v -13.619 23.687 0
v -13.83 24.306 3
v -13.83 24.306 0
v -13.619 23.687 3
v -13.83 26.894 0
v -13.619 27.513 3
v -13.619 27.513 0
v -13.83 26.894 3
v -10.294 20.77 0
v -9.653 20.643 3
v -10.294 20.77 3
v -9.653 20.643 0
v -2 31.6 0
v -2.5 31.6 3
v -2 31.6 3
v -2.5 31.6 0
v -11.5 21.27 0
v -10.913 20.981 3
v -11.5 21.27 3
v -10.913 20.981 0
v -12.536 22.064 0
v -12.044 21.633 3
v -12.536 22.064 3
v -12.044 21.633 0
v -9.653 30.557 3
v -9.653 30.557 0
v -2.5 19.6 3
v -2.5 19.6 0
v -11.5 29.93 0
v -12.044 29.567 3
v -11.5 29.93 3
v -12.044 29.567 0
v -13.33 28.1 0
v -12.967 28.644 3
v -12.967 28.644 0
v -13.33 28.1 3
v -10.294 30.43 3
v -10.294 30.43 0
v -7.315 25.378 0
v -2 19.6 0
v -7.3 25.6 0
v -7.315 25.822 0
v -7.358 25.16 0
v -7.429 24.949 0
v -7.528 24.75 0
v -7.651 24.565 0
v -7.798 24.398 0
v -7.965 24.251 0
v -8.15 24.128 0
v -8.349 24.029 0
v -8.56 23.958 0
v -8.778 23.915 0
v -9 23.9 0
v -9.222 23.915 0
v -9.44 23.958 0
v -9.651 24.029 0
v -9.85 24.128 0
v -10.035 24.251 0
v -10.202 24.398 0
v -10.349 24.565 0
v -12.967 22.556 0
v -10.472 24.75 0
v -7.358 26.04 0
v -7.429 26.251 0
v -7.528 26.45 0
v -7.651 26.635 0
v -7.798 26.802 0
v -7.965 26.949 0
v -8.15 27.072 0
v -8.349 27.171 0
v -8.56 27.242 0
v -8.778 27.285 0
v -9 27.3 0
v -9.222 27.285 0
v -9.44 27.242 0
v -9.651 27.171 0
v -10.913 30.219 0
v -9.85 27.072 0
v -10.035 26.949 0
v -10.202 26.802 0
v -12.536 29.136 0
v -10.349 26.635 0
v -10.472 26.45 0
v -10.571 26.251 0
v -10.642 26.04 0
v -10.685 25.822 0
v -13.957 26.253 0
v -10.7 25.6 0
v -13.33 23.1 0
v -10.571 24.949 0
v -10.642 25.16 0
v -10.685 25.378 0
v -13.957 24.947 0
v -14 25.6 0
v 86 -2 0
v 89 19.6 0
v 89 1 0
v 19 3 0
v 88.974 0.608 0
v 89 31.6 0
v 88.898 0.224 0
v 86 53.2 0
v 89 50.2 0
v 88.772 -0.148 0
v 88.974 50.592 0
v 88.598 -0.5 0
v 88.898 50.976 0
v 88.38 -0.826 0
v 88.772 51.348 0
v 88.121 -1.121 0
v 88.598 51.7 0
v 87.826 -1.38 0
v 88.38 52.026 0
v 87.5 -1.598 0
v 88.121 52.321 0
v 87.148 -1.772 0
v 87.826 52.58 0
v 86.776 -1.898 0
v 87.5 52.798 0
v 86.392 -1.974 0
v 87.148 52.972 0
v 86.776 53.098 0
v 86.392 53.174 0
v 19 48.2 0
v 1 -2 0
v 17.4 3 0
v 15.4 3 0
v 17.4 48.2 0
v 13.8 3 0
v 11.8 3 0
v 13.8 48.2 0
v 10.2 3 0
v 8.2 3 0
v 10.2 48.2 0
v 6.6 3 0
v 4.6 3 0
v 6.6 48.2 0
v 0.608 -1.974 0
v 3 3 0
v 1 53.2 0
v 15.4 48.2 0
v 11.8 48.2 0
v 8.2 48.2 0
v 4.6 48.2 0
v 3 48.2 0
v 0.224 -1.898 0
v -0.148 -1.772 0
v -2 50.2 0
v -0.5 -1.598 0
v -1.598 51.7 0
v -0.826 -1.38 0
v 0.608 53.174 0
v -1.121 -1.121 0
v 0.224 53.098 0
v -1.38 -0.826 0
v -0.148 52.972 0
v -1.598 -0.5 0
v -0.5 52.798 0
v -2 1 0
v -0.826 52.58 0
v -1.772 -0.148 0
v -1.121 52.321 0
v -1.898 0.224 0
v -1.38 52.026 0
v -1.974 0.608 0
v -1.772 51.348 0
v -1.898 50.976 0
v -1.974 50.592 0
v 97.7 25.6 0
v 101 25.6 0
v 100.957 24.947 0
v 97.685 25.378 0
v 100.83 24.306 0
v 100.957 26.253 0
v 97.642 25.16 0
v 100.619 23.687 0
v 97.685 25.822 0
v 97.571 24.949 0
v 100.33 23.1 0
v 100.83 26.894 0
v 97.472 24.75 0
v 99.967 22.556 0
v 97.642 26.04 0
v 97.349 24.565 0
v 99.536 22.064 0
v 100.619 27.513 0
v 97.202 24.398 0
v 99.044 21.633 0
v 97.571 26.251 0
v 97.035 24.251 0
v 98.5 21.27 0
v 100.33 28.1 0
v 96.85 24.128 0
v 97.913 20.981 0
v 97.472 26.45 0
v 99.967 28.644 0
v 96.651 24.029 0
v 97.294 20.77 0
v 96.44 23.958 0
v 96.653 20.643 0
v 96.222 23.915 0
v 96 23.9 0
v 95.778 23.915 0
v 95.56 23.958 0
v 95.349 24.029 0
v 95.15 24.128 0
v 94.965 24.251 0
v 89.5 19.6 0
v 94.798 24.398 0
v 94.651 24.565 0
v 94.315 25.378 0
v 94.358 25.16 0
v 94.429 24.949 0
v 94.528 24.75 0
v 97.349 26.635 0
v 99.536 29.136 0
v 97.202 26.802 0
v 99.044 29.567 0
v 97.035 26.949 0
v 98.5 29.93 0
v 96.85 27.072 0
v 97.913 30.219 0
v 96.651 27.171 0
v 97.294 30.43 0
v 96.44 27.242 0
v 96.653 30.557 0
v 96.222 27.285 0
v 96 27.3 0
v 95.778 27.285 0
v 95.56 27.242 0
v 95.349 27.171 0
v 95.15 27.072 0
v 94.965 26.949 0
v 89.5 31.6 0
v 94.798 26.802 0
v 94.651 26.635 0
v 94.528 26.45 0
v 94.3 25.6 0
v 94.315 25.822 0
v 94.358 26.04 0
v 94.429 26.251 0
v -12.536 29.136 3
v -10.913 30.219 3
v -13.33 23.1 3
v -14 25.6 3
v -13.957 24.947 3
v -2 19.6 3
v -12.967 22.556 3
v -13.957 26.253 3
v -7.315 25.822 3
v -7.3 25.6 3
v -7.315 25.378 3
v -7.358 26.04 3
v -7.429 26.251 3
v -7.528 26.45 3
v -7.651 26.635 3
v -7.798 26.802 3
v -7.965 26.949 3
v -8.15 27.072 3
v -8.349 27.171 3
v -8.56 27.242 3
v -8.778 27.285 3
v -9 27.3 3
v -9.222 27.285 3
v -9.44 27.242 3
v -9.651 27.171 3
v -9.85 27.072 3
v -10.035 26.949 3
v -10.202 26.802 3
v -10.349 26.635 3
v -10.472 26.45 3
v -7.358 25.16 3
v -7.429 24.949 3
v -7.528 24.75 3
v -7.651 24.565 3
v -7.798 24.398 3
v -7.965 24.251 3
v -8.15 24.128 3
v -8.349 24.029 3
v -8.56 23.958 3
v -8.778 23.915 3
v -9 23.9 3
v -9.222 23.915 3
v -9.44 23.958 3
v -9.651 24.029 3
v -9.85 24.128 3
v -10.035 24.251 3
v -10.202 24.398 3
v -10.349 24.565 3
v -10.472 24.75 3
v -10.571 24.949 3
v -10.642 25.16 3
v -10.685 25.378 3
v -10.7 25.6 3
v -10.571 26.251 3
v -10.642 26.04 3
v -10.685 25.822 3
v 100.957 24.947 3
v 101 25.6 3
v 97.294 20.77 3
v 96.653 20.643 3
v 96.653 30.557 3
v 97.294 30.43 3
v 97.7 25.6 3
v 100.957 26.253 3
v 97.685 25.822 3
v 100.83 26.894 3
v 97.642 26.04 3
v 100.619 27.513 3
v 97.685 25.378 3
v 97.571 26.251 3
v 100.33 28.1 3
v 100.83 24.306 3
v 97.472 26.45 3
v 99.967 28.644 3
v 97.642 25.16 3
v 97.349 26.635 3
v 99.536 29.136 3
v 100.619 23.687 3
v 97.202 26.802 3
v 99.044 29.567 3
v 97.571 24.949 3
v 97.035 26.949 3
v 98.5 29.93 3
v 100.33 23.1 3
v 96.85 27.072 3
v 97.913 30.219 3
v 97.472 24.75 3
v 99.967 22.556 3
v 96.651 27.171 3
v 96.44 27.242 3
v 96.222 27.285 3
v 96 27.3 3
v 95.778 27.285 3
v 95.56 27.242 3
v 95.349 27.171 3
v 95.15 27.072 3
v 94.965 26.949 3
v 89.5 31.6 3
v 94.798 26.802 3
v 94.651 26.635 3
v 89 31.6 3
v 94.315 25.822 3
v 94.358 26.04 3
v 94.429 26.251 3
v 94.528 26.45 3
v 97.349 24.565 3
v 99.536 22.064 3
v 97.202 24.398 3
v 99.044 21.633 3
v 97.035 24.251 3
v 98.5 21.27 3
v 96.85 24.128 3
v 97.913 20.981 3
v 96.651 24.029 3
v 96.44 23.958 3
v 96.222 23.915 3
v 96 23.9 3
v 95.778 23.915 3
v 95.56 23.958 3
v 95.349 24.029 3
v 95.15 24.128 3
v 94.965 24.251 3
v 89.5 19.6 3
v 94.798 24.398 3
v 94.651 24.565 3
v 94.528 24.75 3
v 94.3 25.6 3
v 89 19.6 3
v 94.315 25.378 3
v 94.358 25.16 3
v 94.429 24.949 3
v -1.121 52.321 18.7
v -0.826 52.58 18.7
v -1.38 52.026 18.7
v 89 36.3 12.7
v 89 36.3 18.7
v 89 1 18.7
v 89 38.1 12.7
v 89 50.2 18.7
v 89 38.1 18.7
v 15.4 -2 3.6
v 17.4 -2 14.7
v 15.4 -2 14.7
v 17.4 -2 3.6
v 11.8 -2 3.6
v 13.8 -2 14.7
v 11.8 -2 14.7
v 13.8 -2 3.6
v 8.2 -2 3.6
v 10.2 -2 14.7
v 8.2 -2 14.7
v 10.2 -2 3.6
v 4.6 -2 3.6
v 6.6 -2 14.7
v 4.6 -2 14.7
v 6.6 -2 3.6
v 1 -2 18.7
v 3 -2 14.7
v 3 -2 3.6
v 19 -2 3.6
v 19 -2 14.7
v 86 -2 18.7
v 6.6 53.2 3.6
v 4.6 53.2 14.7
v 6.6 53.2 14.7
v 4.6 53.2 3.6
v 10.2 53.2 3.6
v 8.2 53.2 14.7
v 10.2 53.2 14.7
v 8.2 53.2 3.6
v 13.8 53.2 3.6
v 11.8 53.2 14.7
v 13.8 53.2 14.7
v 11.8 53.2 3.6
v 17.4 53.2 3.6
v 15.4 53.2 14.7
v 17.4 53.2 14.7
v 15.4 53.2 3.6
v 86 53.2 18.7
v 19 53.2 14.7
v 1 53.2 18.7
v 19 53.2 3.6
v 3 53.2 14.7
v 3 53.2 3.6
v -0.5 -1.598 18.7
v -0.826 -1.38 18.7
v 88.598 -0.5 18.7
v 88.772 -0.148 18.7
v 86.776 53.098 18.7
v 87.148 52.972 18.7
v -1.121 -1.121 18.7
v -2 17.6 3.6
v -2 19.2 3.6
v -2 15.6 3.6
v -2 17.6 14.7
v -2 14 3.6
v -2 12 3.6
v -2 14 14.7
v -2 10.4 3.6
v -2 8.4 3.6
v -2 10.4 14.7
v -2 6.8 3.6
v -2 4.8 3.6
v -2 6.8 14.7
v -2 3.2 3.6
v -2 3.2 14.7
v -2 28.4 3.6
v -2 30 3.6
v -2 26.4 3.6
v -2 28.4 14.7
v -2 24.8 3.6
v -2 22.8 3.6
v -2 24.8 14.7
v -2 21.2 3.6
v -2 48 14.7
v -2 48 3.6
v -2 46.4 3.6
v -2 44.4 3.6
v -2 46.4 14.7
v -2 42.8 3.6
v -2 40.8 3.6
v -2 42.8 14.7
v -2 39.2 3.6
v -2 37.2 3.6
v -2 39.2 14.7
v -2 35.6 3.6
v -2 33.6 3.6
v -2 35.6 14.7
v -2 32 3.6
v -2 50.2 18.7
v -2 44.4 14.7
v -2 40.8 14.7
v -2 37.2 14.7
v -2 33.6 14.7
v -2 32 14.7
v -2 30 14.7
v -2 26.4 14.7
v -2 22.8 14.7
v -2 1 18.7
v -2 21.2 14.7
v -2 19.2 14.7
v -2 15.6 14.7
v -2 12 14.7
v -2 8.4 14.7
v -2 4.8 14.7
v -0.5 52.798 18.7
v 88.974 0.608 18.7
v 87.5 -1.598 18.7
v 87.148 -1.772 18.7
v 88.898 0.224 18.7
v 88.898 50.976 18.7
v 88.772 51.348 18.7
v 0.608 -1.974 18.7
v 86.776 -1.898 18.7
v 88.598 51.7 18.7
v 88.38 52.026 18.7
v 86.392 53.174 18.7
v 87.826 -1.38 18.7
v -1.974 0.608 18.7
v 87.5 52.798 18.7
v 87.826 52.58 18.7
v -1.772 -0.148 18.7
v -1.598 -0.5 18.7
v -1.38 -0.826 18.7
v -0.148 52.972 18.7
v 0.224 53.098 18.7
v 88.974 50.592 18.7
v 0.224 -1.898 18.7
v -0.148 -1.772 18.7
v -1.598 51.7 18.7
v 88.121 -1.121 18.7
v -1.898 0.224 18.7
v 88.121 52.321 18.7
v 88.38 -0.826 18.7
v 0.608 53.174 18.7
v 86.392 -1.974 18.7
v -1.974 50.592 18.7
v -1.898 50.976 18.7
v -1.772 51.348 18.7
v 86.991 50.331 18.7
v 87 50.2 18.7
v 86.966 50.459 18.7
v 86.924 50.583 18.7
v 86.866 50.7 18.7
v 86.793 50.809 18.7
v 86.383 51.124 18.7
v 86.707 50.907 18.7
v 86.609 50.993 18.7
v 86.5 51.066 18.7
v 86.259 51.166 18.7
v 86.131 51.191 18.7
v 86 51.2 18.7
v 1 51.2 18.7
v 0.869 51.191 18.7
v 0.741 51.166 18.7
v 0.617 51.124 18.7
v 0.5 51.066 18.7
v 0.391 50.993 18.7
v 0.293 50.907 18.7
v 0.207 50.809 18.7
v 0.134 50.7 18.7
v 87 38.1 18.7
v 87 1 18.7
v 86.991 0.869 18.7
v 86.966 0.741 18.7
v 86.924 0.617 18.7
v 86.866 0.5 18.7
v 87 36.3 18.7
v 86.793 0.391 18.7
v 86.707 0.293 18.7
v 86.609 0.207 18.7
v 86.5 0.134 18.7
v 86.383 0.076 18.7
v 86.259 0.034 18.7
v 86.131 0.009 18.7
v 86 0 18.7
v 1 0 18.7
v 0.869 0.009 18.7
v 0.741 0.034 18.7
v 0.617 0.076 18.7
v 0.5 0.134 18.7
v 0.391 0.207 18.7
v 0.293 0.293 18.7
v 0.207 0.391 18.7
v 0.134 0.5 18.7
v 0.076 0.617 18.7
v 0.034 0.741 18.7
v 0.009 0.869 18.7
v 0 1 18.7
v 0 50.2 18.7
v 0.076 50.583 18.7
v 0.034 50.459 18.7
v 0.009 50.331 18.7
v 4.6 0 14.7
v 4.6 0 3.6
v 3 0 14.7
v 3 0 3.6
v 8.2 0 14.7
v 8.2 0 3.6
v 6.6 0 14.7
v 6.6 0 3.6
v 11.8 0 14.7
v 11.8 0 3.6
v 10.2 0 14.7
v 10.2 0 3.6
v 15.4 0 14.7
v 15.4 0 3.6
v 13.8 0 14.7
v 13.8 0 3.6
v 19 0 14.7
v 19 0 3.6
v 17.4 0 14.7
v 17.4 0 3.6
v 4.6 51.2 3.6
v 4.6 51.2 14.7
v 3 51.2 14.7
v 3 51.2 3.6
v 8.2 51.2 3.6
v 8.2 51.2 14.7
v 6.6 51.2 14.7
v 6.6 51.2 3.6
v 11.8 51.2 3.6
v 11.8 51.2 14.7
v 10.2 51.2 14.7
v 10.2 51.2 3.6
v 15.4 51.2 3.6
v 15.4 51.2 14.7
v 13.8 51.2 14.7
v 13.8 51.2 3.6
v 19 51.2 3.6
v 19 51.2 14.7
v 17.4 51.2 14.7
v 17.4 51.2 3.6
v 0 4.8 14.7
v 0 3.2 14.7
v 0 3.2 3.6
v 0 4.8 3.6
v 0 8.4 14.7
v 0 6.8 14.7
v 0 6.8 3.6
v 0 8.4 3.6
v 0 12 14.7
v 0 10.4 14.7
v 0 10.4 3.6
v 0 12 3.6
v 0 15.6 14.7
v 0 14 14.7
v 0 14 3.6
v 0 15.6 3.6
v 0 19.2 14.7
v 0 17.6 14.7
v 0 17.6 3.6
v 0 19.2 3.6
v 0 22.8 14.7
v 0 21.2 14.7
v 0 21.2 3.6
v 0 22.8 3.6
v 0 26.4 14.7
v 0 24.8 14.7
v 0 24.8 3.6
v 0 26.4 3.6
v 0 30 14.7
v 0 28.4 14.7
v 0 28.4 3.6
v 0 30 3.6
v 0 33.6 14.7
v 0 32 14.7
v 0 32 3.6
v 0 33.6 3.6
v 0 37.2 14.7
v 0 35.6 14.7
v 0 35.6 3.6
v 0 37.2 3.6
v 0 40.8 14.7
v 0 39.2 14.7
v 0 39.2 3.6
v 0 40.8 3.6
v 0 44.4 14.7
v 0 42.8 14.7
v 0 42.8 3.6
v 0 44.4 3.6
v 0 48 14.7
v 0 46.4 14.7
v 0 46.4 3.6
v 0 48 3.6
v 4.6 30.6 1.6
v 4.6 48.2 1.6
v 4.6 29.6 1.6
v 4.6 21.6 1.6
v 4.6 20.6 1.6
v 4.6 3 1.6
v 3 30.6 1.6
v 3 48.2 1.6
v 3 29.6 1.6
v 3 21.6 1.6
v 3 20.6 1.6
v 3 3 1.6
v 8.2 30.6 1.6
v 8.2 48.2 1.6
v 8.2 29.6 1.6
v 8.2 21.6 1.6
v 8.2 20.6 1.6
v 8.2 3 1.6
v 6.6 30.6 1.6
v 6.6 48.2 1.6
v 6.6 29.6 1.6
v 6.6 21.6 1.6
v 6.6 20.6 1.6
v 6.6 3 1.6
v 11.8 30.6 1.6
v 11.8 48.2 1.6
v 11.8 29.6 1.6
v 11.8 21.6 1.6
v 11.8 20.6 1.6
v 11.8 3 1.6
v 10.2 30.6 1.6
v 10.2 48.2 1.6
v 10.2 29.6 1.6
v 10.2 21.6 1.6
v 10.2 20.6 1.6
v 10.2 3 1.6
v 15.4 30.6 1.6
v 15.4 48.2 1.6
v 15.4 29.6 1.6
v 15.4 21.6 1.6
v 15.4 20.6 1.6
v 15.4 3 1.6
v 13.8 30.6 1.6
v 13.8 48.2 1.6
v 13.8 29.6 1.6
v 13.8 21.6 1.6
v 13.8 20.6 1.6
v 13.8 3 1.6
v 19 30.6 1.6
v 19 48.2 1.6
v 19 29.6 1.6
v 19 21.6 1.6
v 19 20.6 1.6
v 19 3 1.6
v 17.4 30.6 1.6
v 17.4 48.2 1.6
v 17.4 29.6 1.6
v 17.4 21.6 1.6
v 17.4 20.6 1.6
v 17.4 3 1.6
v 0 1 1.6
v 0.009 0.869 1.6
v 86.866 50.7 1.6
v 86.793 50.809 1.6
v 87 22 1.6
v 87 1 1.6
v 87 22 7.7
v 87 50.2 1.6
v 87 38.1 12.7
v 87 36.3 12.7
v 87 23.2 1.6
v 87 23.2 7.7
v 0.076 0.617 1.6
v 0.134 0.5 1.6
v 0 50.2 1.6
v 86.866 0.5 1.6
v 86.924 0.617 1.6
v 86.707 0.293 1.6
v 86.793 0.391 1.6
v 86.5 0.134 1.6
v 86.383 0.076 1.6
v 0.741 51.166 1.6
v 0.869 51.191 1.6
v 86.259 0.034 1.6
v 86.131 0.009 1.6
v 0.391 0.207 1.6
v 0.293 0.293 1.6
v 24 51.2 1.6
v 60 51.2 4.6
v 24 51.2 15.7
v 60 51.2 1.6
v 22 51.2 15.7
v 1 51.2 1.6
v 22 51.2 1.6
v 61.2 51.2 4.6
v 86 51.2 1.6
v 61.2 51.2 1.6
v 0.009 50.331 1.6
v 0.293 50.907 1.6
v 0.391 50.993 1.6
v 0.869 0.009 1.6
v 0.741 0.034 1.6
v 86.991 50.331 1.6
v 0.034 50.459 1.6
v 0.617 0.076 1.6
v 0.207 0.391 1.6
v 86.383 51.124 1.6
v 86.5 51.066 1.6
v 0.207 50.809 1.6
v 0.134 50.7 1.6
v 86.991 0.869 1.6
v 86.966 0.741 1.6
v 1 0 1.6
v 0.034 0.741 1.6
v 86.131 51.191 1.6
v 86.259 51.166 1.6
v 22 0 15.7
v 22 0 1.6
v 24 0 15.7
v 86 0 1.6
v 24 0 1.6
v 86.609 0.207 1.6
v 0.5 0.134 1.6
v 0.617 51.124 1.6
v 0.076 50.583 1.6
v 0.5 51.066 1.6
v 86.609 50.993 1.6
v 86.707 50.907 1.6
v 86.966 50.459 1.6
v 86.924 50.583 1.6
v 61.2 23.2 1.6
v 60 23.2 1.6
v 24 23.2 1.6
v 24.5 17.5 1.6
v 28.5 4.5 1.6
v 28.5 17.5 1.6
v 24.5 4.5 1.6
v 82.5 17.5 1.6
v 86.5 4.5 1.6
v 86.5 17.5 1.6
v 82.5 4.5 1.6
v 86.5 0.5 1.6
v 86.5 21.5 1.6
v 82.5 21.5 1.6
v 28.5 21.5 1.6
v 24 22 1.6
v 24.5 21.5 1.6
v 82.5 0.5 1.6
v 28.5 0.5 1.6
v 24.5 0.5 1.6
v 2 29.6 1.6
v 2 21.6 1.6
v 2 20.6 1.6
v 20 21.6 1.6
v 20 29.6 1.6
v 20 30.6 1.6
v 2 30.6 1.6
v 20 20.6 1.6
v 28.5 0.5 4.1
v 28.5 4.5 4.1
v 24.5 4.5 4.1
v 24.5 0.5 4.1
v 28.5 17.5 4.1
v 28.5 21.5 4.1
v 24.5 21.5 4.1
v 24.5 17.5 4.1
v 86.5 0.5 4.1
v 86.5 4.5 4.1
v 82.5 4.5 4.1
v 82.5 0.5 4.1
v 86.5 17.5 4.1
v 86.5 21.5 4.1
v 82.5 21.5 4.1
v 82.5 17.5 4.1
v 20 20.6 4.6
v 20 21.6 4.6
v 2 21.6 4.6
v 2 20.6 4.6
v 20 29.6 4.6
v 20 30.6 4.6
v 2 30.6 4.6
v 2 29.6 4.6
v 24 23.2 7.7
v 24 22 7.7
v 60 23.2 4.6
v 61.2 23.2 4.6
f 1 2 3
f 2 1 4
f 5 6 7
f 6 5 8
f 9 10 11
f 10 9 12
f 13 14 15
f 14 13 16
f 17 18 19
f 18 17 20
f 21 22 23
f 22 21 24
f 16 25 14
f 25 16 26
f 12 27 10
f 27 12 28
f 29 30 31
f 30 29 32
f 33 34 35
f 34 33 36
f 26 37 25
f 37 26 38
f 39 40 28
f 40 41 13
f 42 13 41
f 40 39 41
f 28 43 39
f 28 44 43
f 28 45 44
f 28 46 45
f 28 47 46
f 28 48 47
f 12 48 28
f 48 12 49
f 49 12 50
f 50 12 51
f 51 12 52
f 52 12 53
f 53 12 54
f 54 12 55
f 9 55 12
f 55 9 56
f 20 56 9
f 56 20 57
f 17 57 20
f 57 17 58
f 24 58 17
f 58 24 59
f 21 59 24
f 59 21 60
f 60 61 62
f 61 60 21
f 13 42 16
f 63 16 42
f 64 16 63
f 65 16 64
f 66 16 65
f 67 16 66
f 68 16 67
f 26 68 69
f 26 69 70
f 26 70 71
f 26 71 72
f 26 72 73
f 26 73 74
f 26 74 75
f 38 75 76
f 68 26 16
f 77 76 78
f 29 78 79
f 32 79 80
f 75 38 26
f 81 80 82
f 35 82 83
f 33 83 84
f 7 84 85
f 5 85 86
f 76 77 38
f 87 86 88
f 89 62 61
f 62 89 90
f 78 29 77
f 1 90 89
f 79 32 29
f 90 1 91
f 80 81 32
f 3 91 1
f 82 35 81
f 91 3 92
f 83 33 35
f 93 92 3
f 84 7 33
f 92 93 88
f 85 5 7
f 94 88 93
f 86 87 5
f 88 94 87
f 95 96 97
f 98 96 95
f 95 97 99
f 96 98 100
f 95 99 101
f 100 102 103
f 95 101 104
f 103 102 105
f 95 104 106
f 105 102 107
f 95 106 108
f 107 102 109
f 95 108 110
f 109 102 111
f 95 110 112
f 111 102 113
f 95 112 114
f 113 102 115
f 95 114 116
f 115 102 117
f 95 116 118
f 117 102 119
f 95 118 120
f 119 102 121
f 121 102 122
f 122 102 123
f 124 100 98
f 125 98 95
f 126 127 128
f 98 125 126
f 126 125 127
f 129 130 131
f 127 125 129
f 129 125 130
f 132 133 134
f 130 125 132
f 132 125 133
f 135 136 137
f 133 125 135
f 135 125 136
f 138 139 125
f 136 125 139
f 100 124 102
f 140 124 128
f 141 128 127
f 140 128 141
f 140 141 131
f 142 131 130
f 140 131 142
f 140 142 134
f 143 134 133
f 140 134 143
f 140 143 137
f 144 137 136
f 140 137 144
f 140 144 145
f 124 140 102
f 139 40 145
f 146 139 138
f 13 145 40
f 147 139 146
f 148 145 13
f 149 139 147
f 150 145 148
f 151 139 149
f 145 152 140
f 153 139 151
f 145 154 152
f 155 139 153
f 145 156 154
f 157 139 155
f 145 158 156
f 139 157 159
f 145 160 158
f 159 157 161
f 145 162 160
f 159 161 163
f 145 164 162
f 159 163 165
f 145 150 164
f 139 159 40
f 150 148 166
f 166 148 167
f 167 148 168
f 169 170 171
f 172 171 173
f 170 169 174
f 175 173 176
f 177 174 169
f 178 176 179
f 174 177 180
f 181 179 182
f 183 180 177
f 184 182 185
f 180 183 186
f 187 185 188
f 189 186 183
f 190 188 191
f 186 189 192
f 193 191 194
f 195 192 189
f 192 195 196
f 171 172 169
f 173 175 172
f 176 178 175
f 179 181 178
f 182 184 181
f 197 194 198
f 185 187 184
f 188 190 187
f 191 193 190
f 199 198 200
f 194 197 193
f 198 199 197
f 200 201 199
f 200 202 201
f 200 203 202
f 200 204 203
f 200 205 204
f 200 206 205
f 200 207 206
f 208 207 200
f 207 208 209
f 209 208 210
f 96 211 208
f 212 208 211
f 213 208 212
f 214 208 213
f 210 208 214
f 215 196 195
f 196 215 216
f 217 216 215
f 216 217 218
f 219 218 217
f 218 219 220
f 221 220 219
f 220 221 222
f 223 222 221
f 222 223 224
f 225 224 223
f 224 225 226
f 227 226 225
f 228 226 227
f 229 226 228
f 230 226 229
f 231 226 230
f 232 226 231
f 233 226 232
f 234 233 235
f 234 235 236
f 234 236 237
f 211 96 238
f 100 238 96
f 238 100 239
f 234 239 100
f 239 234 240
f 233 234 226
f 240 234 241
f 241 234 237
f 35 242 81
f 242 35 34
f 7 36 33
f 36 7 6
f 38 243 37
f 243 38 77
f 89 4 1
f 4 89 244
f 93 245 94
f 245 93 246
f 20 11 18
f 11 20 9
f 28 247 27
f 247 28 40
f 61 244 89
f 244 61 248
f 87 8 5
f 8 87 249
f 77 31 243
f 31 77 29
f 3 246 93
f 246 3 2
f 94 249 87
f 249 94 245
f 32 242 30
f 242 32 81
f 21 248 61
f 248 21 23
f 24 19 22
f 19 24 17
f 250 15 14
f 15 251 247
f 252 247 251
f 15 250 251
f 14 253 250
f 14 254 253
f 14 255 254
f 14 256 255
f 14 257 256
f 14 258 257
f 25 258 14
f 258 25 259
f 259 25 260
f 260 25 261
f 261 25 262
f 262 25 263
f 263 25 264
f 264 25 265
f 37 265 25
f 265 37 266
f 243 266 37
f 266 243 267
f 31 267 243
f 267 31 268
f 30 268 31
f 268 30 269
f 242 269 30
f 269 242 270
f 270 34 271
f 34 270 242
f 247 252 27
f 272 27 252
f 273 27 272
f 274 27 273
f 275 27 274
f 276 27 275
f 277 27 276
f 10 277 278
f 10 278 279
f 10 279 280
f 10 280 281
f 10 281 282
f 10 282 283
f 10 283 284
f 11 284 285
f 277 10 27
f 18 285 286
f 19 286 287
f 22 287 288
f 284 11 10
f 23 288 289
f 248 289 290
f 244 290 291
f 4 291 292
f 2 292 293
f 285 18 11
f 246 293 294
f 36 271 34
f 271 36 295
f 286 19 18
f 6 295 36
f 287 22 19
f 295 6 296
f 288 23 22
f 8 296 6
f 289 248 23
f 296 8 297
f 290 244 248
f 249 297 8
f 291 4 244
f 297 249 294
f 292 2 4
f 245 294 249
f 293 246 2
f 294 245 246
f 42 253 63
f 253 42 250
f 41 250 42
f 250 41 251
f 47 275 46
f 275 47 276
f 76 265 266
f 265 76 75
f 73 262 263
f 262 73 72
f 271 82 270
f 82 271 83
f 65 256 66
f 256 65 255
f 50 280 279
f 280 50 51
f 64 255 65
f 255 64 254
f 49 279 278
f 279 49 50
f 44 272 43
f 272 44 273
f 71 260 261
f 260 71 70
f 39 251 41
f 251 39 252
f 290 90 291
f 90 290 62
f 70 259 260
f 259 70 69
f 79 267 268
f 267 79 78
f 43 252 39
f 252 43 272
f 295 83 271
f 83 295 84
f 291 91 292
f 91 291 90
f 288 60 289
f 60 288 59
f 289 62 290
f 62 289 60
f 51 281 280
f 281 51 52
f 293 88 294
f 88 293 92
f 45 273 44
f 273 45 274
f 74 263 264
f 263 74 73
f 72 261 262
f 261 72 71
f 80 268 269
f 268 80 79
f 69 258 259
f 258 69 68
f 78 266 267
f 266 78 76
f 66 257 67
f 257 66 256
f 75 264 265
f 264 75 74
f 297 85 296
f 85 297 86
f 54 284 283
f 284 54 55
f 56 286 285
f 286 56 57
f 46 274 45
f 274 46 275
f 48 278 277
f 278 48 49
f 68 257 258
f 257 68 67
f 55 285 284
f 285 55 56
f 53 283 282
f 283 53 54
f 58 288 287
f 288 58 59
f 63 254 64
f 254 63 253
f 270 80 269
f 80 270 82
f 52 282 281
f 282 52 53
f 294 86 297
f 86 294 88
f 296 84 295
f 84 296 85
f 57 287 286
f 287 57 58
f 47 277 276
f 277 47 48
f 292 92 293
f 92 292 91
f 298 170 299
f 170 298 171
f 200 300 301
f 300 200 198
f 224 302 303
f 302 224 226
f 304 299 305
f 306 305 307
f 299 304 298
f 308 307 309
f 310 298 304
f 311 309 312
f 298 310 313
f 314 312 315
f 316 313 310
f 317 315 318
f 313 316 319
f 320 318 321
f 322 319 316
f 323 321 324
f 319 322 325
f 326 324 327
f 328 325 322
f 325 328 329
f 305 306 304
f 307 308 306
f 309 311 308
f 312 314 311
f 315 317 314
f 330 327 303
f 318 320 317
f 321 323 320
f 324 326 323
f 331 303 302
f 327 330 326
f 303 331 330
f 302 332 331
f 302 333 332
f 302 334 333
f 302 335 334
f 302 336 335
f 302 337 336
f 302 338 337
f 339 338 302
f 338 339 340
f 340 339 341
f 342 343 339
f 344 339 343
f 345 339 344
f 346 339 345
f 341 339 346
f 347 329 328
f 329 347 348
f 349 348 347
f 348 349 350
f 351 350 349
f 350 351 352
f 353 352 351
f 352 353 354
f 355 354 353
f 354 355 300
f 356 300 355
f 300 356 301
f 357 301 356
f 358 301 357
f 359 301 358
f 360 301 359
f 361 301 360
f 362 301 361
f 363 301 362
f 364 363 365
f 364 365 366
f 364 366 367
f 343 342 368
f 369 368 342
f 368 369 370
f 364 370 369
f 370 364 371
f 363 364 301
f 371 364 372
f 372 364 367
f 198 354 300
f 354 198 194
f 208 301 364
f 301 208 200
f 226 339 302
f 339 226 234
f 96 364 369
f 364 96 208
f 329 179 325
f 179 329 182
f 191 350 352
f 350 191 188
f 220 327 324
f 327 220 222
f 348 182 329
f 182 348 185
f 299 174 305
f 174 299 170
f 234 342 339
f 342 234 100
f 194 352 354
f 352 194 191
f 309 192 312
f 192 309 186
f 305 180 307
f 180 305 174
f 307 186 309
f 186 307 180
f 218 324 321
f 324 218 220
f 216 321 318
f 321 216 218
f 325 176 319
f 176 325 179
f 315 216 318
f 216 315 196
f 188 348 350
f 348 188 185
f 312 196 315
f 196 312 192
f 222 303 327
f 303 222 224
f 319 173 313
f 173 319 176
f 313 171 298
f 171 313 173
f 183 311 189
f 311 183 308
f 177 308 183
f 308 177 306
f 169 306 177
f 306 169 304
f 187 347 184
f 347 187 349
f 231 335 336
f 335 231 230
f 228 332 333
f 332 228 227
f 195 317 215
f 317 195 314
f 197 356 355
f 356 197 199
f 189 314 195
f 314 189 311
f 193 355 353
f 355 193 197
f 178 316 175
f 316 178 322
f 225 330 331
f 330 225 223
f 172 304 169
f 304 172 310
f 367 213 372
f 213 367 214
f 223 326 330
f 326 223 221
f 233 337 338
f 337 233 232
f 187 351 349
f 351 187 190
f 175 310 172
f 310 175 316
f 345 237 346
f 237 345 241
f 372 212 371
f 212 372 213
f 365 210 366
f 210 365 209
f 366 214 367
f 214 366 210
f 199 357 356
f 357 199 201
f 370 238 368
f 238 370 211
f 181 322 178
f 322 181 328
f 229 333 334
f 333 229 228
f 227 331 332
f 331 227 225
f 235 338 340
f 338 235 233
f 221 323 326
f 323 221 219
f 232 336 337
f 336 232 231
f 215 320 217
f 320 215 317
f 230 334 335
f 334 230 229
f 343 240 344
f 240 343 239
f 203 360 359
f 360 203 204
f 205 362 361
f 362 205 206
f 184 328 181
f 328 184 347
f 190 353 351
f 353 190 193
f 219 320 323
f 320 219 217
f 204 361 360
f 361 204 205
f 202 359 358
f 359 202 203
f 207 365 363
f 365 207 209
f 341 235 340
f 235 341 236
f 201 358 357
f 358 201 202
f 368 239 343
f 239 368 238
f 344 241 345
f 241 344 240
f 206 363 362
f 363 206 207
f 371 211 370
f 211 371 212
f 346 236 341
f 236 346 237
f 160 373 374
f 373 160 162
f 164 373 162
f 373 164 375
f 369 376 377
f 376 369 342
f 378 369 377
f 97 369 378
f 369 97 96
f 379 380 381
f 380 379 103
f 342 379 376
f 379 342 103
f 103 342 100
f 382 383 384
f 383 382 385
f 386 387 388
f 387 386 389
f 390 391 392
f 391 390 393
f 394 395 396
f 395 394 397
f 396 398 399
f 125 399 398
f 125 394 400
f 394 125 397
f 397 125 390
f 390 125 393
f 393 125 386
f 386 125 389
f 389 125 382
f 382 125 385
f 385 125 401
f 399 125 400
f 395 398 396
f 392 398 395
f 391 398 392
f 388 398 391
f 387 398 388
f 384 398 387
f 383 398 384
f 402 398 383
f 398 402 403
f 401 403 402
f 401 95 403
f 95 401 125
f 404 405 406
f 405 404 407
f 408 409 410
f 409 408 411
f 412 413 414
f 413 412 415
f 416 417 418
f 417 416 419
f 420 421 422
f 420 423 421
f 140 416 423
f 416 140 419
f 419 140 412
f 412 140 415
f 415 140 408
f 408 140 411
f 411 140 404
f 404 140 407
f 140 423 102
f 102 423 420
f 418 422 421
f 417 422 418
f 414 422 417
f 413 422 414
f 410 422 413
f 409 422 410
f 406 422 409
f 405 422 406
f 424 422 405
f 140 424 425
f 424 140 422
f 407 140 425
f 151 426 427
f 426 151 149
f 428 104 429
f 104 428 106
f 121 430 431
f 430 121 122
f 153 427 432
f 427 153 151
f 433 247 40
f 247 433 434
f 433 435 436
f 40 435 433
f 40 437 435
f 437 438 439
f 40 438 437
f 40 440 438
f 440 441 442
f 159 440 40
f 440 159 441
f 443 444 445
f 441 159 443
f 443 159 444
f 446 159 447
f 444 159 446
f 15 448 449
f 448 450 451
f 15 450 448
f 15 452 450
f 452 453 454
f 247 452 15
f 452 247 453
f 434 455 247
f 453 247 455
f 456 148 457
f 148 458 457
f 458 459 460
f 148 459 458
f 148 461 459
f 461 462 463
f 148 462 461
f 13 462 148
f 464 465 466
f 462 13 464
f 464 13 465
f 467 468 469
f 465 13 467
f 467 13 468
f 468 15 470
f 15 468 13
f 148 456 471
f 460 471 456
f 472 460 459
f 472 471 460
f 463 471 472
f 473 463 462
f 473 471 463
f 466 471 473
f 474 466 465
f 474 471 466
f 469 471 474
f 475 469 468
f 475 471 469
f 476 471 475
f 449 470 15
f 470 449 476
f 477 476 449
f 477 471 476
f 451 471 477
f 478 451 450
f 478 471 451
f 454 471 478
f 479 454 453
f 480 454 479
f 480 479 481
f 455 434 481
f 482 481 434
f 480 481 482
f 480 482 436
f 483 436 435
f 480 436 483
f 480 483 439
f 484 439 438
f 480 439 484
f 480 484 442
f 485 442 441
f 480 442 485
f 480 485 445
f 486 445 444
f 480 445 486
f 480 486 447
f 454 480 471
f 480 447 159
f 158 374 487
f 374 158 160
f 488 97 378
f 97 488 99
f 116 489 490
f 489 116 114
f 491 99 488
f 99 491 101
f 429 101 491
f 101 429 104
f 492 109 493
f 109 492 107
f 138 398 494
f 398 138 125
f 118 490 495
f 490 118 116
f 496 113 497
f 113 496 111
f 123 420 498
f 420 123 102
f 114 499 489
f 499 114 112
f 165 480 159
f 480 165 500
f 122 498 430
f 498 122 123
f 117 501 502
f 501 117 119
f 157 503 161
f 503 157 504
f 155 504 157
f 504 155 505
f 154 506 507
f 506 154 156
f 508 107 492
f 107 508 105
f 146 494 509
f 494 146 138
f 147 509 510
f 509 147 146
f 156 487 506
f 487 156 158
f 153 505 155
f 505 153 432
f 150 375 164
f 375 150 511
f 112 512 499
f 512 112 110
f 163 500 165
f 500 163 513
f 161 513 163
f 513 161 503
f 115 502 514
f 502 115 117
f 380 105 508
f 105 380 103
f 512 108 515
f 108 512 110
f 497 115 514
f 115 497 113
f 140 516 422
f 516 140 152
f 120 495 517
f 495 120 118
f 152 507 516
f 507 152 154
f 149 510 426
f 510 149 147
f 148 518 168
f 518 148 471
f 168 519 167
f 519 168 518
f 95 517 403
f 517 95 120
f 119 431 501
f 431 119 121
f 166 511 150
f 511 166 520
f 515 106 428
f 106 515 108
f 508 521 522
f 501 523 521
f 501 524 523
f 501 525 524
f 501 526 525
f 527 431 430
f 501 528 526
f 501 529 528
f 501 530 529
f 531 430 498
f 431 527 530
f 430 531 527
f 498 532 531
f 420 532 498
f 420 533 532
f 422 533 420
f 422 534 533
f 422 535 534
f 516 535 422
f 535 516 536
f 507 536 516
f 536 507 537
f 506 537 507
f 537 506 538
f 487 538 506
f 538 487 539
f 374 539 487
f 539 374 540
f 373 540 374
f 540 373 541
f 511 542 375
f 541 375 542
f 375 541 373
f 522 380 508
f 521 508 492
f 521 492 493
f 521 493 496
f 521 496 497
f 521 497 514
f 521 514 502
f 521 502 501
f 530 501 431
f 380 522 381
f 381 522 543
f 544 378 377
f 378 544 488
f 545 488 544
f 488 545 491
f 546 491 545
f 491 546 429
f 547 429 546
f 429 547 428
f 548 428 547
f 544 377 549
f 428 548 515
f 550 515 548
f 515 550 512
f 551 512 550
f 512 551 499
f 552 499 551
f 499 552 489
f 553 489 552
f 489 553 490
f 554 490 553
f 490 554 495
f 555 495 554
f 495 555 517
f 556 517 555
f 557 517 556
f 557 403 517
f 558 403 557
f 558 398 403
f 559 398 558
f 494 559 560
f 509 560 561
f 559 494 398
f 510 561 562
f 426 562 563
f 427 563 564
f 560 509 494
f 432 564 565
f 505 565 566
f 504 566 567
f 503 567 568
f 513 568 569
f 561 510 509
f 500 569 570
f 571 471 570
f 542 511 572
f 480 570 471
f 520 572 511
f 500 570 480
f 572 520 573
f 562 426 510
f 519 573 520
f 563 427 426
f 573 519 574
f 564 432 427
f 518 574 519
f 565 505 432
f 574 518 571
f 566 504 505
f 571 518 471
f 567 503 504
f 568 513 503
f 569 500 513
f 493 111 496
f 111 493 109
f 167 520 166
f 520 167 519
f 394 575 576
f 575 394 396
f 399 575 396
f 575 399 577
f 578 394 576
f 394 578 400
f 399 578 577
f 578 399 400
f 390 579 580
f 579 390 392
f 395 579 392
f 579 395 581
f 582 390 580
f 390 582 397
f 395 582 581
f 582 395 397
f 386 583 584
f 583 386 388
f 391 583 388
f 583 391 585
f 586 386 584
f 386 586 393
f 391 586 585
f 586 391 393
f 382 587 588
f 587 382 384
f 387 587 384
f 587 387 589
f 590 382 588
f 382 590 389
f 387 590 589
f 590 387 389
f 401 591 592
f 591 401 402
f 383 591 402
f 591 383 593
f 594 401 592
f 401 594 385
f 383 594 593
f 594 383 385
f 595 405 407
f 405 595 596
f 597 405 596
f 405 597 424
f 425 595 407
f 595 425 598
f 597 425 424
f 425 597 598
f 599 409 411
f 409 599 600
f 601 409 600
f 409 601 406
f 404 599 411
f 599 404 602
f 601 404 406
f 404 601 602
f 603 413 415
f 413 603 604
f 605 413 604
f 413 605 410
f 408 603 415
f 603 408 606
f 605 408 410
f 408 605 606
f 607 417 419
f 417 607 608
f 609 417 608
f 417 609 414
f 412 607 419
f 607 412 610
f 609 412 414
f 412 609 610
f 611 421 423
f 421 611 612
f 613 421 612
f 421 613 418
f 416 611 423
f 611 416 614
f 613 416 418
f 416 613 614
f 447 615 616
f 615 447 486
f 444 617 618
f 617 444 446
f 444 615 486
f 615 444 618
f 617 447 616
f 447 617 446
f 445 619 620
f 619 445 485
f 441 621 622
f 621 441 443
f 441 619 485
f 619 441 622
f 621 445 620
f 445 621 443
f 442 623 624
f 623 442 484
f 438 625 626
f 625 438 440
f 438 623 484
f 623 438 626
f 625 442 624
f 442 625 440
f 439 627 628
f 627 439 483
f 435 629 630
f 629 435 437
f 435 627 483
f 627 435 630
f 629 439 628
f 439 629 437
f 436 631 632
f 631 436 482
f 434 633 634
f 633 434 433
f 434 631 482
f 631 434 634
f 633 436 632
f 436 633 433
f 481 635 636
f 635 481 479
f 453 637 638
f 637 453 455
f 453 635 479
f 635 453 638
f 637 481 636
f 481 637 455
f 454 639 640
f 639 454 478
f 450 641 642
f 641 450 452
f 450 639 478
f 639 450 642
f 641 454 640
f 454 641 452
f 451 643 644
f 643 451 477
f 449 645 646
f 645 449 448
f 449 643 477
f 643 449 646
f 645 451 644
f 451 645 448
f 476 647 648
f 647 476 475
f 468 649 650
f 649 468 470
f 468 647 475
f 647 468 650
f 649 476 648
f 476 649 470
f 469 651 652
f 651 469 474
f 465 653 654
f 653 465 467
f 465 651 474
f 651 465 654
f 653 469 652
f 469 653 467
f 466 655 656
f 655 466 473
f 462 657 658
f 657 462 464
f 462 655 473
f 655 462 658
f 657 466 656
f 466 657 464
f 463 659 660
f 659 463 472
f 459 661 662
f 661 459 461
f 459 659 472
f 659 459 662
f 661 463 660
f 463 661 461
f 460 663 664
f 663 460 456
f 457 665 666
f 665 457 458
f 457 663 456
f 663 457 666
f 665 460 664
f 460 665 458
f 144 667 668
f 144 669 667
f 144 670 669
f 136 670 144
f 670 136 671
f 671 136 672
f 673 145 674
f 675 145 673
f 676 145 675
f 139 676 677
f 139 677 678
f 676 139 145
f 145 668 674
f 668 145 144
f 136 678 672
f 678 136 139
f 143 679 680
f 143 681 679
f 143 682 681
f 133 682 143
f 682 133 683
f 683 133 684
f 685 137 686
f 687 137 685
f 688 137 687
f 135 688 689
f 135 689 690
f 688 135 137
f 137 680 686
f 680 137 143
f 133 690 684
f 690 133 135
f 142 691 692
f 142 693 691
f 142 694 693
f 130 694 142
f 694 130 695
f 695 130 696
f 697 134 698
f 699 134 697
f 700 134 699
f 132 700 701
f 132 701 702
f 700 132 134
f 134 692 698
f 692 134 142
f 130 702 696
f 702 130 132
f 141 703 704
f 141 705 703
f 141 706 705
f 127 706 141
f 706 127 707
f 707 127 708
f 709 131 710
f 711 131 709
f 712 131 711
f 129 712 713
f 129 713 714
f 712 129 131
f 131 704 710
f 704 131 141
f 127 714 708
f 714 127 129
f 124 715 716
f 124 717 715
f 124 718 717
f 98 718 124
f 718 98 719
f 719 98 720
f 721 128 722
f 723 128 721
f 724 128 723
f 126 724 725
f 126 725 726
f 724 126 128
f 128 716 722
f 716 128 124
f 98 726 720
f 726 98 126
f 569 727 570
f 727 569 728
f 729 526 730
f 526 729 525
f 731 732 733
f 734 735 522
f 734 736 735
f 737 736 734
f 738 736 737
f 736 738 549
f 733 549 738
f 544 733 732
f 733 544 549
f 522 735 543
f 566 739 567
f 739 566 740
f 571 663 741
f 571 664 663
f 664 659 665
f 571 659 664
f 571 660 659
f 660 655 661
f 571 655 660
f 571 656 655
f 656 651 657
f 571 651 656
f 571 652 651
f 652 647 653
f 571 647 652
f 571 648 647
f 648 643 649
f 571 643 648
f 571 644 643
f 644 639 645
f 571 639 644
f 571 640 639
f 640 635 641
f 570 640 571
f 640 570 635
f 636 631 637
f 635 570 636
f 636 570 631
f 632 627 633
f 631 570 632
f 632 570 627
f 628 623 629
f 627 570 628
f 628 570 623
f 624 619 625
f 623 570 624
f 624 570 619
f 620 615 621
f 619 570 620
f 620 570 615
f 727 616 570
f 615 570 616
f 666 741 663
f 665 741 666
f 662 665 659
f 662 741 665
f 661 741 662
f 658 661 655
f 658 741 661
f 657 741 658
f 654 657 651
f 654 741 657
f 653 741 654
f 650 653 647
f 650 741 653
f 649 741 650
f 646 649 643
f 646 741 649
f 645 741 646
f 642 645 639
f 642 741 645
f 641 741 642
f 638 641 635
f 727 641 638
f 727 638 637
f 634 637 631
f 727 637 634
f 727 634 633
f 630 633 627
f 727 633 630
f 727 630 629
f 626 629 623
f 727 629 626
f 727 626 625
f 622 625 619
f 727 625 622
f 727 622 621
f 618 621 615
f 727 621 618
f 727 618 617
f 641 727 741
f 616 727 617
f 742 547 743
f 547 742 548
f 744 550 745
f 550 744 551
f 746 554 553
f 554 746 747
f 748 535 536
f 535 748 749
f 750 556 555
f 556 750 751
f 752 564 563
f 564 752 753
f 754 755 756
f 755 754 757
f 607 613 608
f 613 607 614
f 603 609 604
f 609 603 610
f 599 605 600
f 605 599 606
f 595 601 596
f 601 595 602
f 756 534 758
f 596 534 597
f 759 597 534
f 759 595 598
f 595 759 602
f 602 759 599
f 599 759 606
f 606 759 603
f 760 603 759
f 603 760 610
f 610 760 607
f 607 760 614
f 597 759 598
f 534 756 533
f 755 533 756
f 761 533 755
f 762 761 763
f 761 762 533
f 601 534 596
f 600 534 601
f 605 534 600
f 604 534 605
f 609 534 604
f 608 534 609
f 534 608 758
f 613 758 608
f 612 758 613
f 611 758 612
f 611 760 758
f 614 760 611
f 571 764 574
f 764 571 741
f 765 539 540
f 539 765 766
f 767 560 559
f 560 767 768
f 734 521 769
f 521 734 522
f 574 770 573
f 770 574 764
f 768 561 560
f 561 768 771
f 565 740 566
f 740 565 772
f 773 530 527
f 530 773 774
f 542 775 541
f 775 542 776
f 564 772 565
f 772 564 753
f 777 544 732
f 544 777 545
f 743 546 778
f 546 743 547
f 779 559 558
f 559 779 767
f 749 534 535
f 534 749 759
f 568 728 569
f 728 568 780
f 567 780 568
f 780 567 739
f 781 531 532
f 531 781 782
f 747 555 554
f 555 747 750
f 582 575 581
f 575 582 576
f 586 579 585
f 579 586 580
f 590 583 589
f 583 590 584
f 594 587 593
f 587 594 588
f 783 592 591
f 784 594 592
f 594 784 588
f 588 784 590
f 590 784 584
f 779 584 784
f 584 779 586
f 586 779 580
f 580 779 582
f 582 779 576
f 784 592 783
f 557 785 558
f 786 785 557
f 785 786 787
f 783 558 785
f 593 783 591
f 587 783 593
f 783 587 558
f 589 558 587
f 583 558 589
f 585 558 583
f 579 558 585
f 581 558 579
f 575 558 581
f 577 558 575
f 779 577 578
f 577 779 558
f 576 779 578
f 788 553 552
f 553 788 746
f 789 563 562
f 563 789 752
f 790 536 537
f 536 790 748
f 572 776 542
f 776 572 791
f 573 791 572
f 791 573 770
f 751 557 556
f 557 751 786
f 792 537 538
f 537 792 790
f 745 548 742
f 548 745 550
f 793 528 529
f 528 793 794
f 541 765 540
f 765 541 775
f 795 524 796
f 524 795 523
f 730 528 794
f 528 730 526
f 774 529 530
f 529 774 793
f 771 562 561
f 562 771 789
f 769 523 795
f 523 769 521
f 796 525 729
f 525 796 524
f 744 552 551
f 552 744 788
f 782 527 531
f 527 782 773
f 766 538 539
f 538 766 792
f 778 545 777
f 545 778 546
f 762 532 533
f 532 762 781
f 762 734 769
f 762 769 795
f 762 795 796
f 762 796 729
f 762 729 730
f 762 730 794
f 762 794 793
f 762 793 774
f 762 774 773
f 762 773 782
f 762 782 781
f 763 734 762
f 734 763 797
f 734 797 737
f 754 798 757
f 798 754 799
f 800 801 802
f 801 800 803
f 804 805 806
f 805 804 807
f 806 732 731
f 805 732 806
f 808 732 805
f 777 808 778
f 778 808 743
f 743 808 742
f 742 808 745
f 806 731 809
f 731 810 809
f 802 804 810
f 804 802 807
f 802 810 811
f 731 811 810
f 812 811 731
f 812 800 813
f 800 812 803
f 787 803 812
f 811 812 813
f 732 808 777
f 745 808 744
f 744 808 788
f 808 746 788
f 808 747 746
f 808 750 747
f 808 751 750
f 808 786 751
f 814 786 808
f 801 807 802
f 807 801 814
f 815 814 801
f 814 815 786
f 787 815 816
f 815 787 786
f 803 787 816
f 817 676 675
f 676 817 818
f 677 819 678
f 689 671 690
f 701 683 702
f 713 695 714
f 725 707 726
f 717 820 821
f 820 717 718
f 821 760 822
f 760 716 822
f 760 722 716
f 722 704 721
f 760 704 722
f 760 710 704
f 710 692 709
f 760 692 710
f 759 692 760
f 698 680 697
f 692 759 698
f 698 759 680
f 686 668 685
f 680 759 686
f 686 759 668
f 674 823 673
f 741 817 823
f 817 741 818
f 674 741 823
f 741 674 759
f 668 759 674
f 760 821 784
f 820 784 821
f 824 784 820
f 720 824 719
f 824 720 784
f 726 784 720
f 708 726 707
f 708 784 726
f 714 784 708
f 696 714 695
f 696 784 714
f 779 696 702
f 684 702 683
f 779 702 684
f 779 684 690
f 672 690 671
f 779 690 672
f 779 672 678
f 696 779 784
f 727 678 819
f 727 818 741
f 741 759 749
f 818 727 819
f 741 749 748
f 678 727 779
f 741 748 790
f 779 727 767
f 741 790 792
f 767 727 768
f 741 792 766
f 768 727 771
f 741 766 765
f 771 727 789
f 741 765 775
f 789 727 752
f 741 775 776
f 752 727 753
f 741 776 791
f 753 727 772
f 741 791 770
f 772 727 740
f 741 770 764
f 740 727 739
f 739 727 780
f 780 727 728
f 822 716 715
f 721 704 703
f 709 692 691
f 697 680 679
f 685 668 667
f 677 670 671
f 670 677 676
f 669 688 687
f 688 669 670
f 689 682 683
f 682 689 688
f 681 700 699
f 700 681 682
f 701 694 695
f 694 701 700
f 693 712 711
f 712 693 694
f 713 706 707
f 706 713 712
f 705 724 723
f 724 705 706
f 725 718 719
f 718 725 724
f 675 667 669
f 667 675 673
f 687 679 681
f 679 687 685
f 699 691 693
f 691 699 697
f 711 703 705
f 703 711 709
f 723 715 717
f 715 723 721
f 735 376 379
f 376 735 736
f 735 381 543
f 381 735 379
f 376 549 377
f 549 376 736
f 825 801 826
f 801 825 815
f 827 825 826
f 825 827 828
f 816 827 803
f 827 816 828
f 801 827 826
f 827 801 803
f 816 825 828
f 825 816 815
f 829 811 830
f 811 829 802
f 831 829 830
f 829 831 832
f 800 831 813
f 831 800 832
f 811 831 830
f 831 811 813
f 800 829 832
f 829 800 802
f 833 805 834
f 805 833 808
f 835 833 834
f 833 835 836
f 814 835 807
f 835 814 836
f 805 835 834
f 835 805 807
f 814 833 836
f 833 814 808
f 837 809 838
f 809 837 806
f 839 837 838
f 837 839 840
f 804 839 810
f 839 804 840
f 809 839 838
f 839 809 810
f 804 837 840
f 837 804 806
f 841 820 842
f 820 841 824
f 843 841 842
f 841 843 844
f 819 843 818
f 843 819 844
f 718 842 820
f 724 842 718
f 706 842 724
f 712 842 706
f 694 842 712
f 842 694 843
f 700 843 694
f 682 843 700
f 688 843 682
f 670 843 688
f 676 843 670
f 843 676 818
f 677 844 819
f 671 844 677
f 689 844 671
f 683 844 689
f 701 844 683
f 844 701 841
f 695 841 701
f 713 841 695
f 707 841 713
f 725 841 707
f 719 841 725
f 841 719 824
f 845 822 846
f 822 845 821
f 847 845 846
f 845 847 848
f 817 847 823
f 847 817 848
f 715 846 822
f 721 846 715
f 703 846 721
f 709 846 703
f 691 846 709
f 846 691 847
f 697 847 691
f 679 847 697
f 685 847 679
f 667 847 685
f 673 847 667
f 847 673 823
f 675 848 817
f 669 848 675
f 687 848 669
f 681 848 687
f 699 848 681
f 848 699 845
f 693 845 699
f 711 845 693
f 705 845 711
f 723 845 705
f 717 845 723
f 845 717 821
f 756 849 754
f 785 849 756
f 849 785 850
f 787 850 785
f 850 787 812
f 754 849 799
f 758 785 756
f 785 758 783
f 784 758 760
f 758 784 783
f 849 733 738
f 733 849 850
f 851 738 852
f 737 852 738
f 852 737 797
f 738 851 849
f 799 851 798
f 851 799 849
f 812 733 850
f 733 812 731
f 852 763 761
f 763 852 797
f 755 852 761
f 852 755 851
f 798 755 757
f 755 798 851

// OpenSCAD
// Proof-of-concept case for the stripboard sensor node
// (veroboard + CR2032 holder + STX882 + GY-21/SHT40 breakout).
//
// Two parts: a base tray and a push-fit lid. The sensor sits in its own
// vented chamber, separated from the electronics by a wall, so heat from the
// board and the transmitter doesn't skew the readings.
//
// Every size below is a GUESS for typical parts. Measure yours and edit the
// numbers before printing (see poc/README.md for what to measure).
//
// Render a single part for export by setting `part`:
//   "base", "lid", "both" (side by side for printing) or "assembly" (preview
//   with ghosted parts, lid lifted).

part = "assembly";

/* [Print] */
wall      = 2.0;   // side wall thickness
floor_t   = 1.6;   // base floor thickness
lid_t     = 1.6;   // lid plate thickness
r_out     = 3.0;   // outer corner radius (inner = r_out - wall)
fit       = 0.25;  // gap per side between lid lip and base wall (push fit)
clr       = 0.5;   // clearance around parts in their pockets

/* [Stripboard: 8 strips x 24 holes] */
vero_l     = 62;   // length along the strips (24 x 2.54 = 61, plus edge)
vero_w     = 21;   // width across the strips (8 x 2.54 = 20.3, plus edge)
vero_t     = 1.6;  // board thickness
vero_under = 2.5;  // standoff height, clears solder joints and cut tracks
vero_top   = 12;   // tallest part above the board (socketed ATtiny85 ~9 mm)

/* [CR2032 holder, loose in a side bay] */
cell_l = 35;       // generic wired CR2032 box with switch
cell_w = 27;
cell_h = 8;

/* [STX882 transmitter, loose in the side bay] */
tx_l = 22;
tx_w = 10;
tx_h = 5;

/* [Sensor breakout in the vented chamber] */
sens_l   = 15;     // GY-21 ~ 15 x 12 (Adafruit SHT40 is 25.4 x 17.8)
sens_w   = 12;
sens_air = 6;      // extra free air around the sensor along the case length

/* [Lid] */
lip_h = 3.0;       // depth of the lid lip that pushes into the base
lip_t = 1.2;       // lip wall thickness

/* [Vents] */
vent_w   = 1.6;    // slot width (keep >= 2 nozzle widths)
vent_gap = 2.0;    // web between slots

/* [Antenna and mounting] */
ant_d   = 1.8;     // slot for the 17.3 cm antenna wire
ears    = true;    // screw ears on the ends for wall mounting
ear_hole = 3.4;    // M3 / No.4 wood screw

$fn = 48;

// ---------------------------------------------------------------- layout --
// X runs along the case: sensor chamber | divider | stripboard compartment.
// Y: stripboard against the front wall, then a rib, then the side bay with
// the cell holder and transmitter in a row.

sens_ch = sens_l + 2*clr + sens_air;            // sensor chamber length
main_x0 = sens_ch + wall;                       // start of main compartment
main_l  = max(vero_l, cell_l + tx_l + 2) + 2*clr;
rib_t   = 1.2;                                  // board / bay separator
bay_w   = max(cell_w, tx_w) + 2*clr;
bay_y0  = vero_w + 2*clr + rib_t;

in_x = main_x0 + main_l;
in_y = max(bay_y0 + bay_w, sens_w + 2*clr + 6);
in_z = max(vero_under + vero_t + vero_top, cell_h, tx_h) + 1;
r_in = max(r_out - wall, 0.5);

out_x = in_x + 2*wall;
out_y = in_y + 2*wall;
out_z = floor_t + in_z;

wire_notch_w = 6;   // gap in the lid rib for the four sensor wires
wire_notch_h = 2;

echo(str("Outer size (base + lid): ", out_x, " x ", out_y, " x ",
         out_z + lid_t, " mm"));

// --------------------------------------------------------------- helpers --
module rbox(size, r) {
    hull() for (x = [r, size[0] - r], y = [r, size[1] - r])
        translate([x, y, 0]) cylinder(r = r, h = size[2]);
}

// Row of vertical slots through a wall that faces Y, spread over [x0, x1].
module y_slots(x0, x1, y, z0, z1) {
    n = floor((x1 - x0 + vent_gap) / (vent_w + vent_gap));
    span = n * vent_w + (n - 1) * vent_gap;
    if (n > 0) for (i = [0 : n - 1])
        translate([x0 + (x1 - x0 - span) / 2 + i * (vent_w + vent_gap),
                   y - 1, z0])
            cube([vent_w, wall + 2, z1 - z0]);
}

// Row of slots through a wall that faces X, spread over [y0, y1].
module x_slots(y0, y1, x, z0, z1) {
    n = floor((y1 - y0 + vent_gap) / (vent_w + vent_gap));
    span = n * vent_w + (n - 1) * vent_gap;
    if (n > 0) for (i = [0 : n - 1])
        translate([x - 1, y0 + (y1 - y0 - span) / 2 + i * (vent_w + vent_gap),
                   z0])
            cube([wall + 2, vent_w, z1 - z0]);
}

// Slots through a horizontal plate, running along Y, spread over x0..x1.
module plate_slots(x0, x1, y0, y1, z, t) {
    n = floor((x1 - x0 + vent_gap) / (vent_w + vent_gap));
    span = n * vent_w + (n - 1) * vent_gap;
    if (n > 0) for (i = [0 : n - 1])
        translate([x0 + (x1 - x0 - span) / 2 + i * (vent_w + vent_gap),
                   y0, z - 1])
            cube([vent_w, y1 - y0, t + 2]);
}

// ------------------------------------------------------------------ base --
// Origin is the inner front-left corner of the cavity at floor level, so the
// shell spans x -wall..in_x+wall, y -wall..in_y+wall, z -floor_t..in_z.
module base() {
    vz0 = 2;                    // vents start this far above the floor
    vz1 = in_z - lip_h - 1;     // and stop below the lid lip

    difference() {
        union() {
            translate([-wall, -wall, -floor_t]) rbox([out_x, out_y, out_z], r_out);
            if (ears) for (end = [0, 1]) ear(end);
        }

        // cavity
        rbox([in_x, in_y, in_z + 1], r_in);

        // sensor chamber vents: both side walls, the end wall, the floor
        y_slots(2, sens_ch - 2, -wall, vz0, vz1);
        y_slots(2, sens_ch - 2, in_y, vz0, vz1);
        x_slots(r_in + 2, in_y - r_in - 2, -wall, vz0, vz1);
        plate_slots(2, sens_ch - 2, 3, in_y - 3, -floor_t, floor_t);

        // antenna slot, open from the top, in the far end wall beside the
        // transmitter; the wire sits below the lid lip
        translate([in_x - 1, bay_y0 + bay_w / 2 - ant_d / 2, in_z - lip_h - 3])
            cube([wall + 2, ant_d, lip_h + 4]);
    }

    // divider between sensor chamber and electronics; stops lip_h short of
    // the rim, and the lid's rib closes the gap (with a notch for the wires)
    translate([sens_ch, 0, 0]) cube([wall, in_y, in_z - lip_h]);

    // stripboard: four corner standoffs, trapped by the front wall, the
    // divider, the far end wall and the rib
    for (x = [0, vero_l - 4], y = [0, vero_w - 4])
        translate([main_x0 + clr + x, clr + y, 0]) cube([4, 4, vero_under]);

    // rib between stripboard and side bay
    translate([main_x0, vero_w + 2*clr, 0])
        cube([main_l, rib_t, vero_under + vero_t + 2]);

    // low stop between cell holder and transmitter
    translate([main_x0 + clr + cell_l + clr, bay_y0, 0])
        cube([1.2, bay_w, 3]);

    // two rails to lift the sensor off the vented floor
    for (y = [in_y / 2 - sens_w / 2 + 1, in_y / 2 + sens_w / 2 - 2])
        translate([2, y, 0]) cube([sens_ch - 4, 1, 3]);
}

module ear(end) {
    x = end == 0 ? -wall : in_x + wall;
    dir = end == 0 ? -1 : 1;
    difference() {
        hull() {
            translate([x - 0.5, in_y / 2 - 6, -floor_t])
                cube([1, 12, 3]);
            translate([x + dir * 7, in_y / 2, -floor_t]) cylinder(r = 5, h = 3);
        }
        translate([x + dir * 7, in_y / 2, -floor_t - 1])
            cylinder(d = ear_hole, h = 5);
    }
}

// ------------------------------------------------------------------- lid --
// Modelled in print orientation: plate on the bed, lip and rib pointing up.
// Flipping it over to fit mirrors Y only, and the lid is symmetric in Y.
module lid() {
    difference() {
        translate([-wall, -wall, 0]) rbox([out_x, out_y, lid_t], r_out);
        plate_slots(2, sens_ch - 2, 3, in_y - 3, 0, lid_t);
    }

    // lip
    translate([0, 0, lid_t]) difference() {
        translate([fit, fit, 0])
            rbox([in_x - 2*fit, in_y - 2*fit, lip_h], max(r_in - fit, 0.3));
        translate([fit + lip_t, fit + lip_t, -1])
            rbox([in_x - 2*(fit + lip_t), in_y - 2*(fit + lip_t), lip_h + 2],
                 max(r_in - fit - lip_t, 0.3));
    }

    // rib that meets the top of the divider, with a notch for the wires
    translate([0, 0, lid_t]) difference() {
        translate([sens_ch, fit + lip_t, 0])
            cube([wall, in_y - 2*(fit + lip_t), lip_h]);
        translate([sens_ch - 1, in_y / 2 - wire_notch_w / 2, lip_h - wire_notch_h])
            cube([wall + 2, wire_notch_w, wire_notch_h + 1]);
    }
}

// ---------------------------------------------------------- placeholders --
module parts_ghost() {
    // stripboard and its tallest part
    translate([main_x0 + clr, clr, vero_under]) {
        color("peru") cube([vero_l, vero_w, vero_t]);
        color("dimgray") translate([vero_l * 0.15, vero_w * 0.25, vero_t])
            cube([10, 10, vero_top]);
    }
    color("silver") translate([main_x0 + clr, bay_y0 + clr, 0])
        cube([cell_l, cell_w, cell_h]);
    color("green") translate([main_x0 + clr + cell_l + 2*clr + 1.2, bay_y0 + clr, 0])
        cube([tx_l, tx_w, tx_h]);
    color("purple") translate([clr + sens_air / 2, in_y / 2 - sens_w / 2, 3])
        cube([sens_l, sens_w, 1.6]);
}

// ---------------------------------------------------------------- output --
if (part == "base") {
    translate([0, 0, floor_t]) base();
} else if (part == "lid") {
    lid();
} else if (part == "both") {
    translate([0, 0, floor_t]) base();
    translate([0, out_y + 10, 0]) lid();
} else {
    translate([0, 0, floor_t]) {
        base();
        %parts_ghost();
    }
    // lid flipped into place and lifted so the inside shows
    %translate([0, in_y, floor_t + in_z + lid_t + 15]) rotate([180, 0, 0]) lid();
}
